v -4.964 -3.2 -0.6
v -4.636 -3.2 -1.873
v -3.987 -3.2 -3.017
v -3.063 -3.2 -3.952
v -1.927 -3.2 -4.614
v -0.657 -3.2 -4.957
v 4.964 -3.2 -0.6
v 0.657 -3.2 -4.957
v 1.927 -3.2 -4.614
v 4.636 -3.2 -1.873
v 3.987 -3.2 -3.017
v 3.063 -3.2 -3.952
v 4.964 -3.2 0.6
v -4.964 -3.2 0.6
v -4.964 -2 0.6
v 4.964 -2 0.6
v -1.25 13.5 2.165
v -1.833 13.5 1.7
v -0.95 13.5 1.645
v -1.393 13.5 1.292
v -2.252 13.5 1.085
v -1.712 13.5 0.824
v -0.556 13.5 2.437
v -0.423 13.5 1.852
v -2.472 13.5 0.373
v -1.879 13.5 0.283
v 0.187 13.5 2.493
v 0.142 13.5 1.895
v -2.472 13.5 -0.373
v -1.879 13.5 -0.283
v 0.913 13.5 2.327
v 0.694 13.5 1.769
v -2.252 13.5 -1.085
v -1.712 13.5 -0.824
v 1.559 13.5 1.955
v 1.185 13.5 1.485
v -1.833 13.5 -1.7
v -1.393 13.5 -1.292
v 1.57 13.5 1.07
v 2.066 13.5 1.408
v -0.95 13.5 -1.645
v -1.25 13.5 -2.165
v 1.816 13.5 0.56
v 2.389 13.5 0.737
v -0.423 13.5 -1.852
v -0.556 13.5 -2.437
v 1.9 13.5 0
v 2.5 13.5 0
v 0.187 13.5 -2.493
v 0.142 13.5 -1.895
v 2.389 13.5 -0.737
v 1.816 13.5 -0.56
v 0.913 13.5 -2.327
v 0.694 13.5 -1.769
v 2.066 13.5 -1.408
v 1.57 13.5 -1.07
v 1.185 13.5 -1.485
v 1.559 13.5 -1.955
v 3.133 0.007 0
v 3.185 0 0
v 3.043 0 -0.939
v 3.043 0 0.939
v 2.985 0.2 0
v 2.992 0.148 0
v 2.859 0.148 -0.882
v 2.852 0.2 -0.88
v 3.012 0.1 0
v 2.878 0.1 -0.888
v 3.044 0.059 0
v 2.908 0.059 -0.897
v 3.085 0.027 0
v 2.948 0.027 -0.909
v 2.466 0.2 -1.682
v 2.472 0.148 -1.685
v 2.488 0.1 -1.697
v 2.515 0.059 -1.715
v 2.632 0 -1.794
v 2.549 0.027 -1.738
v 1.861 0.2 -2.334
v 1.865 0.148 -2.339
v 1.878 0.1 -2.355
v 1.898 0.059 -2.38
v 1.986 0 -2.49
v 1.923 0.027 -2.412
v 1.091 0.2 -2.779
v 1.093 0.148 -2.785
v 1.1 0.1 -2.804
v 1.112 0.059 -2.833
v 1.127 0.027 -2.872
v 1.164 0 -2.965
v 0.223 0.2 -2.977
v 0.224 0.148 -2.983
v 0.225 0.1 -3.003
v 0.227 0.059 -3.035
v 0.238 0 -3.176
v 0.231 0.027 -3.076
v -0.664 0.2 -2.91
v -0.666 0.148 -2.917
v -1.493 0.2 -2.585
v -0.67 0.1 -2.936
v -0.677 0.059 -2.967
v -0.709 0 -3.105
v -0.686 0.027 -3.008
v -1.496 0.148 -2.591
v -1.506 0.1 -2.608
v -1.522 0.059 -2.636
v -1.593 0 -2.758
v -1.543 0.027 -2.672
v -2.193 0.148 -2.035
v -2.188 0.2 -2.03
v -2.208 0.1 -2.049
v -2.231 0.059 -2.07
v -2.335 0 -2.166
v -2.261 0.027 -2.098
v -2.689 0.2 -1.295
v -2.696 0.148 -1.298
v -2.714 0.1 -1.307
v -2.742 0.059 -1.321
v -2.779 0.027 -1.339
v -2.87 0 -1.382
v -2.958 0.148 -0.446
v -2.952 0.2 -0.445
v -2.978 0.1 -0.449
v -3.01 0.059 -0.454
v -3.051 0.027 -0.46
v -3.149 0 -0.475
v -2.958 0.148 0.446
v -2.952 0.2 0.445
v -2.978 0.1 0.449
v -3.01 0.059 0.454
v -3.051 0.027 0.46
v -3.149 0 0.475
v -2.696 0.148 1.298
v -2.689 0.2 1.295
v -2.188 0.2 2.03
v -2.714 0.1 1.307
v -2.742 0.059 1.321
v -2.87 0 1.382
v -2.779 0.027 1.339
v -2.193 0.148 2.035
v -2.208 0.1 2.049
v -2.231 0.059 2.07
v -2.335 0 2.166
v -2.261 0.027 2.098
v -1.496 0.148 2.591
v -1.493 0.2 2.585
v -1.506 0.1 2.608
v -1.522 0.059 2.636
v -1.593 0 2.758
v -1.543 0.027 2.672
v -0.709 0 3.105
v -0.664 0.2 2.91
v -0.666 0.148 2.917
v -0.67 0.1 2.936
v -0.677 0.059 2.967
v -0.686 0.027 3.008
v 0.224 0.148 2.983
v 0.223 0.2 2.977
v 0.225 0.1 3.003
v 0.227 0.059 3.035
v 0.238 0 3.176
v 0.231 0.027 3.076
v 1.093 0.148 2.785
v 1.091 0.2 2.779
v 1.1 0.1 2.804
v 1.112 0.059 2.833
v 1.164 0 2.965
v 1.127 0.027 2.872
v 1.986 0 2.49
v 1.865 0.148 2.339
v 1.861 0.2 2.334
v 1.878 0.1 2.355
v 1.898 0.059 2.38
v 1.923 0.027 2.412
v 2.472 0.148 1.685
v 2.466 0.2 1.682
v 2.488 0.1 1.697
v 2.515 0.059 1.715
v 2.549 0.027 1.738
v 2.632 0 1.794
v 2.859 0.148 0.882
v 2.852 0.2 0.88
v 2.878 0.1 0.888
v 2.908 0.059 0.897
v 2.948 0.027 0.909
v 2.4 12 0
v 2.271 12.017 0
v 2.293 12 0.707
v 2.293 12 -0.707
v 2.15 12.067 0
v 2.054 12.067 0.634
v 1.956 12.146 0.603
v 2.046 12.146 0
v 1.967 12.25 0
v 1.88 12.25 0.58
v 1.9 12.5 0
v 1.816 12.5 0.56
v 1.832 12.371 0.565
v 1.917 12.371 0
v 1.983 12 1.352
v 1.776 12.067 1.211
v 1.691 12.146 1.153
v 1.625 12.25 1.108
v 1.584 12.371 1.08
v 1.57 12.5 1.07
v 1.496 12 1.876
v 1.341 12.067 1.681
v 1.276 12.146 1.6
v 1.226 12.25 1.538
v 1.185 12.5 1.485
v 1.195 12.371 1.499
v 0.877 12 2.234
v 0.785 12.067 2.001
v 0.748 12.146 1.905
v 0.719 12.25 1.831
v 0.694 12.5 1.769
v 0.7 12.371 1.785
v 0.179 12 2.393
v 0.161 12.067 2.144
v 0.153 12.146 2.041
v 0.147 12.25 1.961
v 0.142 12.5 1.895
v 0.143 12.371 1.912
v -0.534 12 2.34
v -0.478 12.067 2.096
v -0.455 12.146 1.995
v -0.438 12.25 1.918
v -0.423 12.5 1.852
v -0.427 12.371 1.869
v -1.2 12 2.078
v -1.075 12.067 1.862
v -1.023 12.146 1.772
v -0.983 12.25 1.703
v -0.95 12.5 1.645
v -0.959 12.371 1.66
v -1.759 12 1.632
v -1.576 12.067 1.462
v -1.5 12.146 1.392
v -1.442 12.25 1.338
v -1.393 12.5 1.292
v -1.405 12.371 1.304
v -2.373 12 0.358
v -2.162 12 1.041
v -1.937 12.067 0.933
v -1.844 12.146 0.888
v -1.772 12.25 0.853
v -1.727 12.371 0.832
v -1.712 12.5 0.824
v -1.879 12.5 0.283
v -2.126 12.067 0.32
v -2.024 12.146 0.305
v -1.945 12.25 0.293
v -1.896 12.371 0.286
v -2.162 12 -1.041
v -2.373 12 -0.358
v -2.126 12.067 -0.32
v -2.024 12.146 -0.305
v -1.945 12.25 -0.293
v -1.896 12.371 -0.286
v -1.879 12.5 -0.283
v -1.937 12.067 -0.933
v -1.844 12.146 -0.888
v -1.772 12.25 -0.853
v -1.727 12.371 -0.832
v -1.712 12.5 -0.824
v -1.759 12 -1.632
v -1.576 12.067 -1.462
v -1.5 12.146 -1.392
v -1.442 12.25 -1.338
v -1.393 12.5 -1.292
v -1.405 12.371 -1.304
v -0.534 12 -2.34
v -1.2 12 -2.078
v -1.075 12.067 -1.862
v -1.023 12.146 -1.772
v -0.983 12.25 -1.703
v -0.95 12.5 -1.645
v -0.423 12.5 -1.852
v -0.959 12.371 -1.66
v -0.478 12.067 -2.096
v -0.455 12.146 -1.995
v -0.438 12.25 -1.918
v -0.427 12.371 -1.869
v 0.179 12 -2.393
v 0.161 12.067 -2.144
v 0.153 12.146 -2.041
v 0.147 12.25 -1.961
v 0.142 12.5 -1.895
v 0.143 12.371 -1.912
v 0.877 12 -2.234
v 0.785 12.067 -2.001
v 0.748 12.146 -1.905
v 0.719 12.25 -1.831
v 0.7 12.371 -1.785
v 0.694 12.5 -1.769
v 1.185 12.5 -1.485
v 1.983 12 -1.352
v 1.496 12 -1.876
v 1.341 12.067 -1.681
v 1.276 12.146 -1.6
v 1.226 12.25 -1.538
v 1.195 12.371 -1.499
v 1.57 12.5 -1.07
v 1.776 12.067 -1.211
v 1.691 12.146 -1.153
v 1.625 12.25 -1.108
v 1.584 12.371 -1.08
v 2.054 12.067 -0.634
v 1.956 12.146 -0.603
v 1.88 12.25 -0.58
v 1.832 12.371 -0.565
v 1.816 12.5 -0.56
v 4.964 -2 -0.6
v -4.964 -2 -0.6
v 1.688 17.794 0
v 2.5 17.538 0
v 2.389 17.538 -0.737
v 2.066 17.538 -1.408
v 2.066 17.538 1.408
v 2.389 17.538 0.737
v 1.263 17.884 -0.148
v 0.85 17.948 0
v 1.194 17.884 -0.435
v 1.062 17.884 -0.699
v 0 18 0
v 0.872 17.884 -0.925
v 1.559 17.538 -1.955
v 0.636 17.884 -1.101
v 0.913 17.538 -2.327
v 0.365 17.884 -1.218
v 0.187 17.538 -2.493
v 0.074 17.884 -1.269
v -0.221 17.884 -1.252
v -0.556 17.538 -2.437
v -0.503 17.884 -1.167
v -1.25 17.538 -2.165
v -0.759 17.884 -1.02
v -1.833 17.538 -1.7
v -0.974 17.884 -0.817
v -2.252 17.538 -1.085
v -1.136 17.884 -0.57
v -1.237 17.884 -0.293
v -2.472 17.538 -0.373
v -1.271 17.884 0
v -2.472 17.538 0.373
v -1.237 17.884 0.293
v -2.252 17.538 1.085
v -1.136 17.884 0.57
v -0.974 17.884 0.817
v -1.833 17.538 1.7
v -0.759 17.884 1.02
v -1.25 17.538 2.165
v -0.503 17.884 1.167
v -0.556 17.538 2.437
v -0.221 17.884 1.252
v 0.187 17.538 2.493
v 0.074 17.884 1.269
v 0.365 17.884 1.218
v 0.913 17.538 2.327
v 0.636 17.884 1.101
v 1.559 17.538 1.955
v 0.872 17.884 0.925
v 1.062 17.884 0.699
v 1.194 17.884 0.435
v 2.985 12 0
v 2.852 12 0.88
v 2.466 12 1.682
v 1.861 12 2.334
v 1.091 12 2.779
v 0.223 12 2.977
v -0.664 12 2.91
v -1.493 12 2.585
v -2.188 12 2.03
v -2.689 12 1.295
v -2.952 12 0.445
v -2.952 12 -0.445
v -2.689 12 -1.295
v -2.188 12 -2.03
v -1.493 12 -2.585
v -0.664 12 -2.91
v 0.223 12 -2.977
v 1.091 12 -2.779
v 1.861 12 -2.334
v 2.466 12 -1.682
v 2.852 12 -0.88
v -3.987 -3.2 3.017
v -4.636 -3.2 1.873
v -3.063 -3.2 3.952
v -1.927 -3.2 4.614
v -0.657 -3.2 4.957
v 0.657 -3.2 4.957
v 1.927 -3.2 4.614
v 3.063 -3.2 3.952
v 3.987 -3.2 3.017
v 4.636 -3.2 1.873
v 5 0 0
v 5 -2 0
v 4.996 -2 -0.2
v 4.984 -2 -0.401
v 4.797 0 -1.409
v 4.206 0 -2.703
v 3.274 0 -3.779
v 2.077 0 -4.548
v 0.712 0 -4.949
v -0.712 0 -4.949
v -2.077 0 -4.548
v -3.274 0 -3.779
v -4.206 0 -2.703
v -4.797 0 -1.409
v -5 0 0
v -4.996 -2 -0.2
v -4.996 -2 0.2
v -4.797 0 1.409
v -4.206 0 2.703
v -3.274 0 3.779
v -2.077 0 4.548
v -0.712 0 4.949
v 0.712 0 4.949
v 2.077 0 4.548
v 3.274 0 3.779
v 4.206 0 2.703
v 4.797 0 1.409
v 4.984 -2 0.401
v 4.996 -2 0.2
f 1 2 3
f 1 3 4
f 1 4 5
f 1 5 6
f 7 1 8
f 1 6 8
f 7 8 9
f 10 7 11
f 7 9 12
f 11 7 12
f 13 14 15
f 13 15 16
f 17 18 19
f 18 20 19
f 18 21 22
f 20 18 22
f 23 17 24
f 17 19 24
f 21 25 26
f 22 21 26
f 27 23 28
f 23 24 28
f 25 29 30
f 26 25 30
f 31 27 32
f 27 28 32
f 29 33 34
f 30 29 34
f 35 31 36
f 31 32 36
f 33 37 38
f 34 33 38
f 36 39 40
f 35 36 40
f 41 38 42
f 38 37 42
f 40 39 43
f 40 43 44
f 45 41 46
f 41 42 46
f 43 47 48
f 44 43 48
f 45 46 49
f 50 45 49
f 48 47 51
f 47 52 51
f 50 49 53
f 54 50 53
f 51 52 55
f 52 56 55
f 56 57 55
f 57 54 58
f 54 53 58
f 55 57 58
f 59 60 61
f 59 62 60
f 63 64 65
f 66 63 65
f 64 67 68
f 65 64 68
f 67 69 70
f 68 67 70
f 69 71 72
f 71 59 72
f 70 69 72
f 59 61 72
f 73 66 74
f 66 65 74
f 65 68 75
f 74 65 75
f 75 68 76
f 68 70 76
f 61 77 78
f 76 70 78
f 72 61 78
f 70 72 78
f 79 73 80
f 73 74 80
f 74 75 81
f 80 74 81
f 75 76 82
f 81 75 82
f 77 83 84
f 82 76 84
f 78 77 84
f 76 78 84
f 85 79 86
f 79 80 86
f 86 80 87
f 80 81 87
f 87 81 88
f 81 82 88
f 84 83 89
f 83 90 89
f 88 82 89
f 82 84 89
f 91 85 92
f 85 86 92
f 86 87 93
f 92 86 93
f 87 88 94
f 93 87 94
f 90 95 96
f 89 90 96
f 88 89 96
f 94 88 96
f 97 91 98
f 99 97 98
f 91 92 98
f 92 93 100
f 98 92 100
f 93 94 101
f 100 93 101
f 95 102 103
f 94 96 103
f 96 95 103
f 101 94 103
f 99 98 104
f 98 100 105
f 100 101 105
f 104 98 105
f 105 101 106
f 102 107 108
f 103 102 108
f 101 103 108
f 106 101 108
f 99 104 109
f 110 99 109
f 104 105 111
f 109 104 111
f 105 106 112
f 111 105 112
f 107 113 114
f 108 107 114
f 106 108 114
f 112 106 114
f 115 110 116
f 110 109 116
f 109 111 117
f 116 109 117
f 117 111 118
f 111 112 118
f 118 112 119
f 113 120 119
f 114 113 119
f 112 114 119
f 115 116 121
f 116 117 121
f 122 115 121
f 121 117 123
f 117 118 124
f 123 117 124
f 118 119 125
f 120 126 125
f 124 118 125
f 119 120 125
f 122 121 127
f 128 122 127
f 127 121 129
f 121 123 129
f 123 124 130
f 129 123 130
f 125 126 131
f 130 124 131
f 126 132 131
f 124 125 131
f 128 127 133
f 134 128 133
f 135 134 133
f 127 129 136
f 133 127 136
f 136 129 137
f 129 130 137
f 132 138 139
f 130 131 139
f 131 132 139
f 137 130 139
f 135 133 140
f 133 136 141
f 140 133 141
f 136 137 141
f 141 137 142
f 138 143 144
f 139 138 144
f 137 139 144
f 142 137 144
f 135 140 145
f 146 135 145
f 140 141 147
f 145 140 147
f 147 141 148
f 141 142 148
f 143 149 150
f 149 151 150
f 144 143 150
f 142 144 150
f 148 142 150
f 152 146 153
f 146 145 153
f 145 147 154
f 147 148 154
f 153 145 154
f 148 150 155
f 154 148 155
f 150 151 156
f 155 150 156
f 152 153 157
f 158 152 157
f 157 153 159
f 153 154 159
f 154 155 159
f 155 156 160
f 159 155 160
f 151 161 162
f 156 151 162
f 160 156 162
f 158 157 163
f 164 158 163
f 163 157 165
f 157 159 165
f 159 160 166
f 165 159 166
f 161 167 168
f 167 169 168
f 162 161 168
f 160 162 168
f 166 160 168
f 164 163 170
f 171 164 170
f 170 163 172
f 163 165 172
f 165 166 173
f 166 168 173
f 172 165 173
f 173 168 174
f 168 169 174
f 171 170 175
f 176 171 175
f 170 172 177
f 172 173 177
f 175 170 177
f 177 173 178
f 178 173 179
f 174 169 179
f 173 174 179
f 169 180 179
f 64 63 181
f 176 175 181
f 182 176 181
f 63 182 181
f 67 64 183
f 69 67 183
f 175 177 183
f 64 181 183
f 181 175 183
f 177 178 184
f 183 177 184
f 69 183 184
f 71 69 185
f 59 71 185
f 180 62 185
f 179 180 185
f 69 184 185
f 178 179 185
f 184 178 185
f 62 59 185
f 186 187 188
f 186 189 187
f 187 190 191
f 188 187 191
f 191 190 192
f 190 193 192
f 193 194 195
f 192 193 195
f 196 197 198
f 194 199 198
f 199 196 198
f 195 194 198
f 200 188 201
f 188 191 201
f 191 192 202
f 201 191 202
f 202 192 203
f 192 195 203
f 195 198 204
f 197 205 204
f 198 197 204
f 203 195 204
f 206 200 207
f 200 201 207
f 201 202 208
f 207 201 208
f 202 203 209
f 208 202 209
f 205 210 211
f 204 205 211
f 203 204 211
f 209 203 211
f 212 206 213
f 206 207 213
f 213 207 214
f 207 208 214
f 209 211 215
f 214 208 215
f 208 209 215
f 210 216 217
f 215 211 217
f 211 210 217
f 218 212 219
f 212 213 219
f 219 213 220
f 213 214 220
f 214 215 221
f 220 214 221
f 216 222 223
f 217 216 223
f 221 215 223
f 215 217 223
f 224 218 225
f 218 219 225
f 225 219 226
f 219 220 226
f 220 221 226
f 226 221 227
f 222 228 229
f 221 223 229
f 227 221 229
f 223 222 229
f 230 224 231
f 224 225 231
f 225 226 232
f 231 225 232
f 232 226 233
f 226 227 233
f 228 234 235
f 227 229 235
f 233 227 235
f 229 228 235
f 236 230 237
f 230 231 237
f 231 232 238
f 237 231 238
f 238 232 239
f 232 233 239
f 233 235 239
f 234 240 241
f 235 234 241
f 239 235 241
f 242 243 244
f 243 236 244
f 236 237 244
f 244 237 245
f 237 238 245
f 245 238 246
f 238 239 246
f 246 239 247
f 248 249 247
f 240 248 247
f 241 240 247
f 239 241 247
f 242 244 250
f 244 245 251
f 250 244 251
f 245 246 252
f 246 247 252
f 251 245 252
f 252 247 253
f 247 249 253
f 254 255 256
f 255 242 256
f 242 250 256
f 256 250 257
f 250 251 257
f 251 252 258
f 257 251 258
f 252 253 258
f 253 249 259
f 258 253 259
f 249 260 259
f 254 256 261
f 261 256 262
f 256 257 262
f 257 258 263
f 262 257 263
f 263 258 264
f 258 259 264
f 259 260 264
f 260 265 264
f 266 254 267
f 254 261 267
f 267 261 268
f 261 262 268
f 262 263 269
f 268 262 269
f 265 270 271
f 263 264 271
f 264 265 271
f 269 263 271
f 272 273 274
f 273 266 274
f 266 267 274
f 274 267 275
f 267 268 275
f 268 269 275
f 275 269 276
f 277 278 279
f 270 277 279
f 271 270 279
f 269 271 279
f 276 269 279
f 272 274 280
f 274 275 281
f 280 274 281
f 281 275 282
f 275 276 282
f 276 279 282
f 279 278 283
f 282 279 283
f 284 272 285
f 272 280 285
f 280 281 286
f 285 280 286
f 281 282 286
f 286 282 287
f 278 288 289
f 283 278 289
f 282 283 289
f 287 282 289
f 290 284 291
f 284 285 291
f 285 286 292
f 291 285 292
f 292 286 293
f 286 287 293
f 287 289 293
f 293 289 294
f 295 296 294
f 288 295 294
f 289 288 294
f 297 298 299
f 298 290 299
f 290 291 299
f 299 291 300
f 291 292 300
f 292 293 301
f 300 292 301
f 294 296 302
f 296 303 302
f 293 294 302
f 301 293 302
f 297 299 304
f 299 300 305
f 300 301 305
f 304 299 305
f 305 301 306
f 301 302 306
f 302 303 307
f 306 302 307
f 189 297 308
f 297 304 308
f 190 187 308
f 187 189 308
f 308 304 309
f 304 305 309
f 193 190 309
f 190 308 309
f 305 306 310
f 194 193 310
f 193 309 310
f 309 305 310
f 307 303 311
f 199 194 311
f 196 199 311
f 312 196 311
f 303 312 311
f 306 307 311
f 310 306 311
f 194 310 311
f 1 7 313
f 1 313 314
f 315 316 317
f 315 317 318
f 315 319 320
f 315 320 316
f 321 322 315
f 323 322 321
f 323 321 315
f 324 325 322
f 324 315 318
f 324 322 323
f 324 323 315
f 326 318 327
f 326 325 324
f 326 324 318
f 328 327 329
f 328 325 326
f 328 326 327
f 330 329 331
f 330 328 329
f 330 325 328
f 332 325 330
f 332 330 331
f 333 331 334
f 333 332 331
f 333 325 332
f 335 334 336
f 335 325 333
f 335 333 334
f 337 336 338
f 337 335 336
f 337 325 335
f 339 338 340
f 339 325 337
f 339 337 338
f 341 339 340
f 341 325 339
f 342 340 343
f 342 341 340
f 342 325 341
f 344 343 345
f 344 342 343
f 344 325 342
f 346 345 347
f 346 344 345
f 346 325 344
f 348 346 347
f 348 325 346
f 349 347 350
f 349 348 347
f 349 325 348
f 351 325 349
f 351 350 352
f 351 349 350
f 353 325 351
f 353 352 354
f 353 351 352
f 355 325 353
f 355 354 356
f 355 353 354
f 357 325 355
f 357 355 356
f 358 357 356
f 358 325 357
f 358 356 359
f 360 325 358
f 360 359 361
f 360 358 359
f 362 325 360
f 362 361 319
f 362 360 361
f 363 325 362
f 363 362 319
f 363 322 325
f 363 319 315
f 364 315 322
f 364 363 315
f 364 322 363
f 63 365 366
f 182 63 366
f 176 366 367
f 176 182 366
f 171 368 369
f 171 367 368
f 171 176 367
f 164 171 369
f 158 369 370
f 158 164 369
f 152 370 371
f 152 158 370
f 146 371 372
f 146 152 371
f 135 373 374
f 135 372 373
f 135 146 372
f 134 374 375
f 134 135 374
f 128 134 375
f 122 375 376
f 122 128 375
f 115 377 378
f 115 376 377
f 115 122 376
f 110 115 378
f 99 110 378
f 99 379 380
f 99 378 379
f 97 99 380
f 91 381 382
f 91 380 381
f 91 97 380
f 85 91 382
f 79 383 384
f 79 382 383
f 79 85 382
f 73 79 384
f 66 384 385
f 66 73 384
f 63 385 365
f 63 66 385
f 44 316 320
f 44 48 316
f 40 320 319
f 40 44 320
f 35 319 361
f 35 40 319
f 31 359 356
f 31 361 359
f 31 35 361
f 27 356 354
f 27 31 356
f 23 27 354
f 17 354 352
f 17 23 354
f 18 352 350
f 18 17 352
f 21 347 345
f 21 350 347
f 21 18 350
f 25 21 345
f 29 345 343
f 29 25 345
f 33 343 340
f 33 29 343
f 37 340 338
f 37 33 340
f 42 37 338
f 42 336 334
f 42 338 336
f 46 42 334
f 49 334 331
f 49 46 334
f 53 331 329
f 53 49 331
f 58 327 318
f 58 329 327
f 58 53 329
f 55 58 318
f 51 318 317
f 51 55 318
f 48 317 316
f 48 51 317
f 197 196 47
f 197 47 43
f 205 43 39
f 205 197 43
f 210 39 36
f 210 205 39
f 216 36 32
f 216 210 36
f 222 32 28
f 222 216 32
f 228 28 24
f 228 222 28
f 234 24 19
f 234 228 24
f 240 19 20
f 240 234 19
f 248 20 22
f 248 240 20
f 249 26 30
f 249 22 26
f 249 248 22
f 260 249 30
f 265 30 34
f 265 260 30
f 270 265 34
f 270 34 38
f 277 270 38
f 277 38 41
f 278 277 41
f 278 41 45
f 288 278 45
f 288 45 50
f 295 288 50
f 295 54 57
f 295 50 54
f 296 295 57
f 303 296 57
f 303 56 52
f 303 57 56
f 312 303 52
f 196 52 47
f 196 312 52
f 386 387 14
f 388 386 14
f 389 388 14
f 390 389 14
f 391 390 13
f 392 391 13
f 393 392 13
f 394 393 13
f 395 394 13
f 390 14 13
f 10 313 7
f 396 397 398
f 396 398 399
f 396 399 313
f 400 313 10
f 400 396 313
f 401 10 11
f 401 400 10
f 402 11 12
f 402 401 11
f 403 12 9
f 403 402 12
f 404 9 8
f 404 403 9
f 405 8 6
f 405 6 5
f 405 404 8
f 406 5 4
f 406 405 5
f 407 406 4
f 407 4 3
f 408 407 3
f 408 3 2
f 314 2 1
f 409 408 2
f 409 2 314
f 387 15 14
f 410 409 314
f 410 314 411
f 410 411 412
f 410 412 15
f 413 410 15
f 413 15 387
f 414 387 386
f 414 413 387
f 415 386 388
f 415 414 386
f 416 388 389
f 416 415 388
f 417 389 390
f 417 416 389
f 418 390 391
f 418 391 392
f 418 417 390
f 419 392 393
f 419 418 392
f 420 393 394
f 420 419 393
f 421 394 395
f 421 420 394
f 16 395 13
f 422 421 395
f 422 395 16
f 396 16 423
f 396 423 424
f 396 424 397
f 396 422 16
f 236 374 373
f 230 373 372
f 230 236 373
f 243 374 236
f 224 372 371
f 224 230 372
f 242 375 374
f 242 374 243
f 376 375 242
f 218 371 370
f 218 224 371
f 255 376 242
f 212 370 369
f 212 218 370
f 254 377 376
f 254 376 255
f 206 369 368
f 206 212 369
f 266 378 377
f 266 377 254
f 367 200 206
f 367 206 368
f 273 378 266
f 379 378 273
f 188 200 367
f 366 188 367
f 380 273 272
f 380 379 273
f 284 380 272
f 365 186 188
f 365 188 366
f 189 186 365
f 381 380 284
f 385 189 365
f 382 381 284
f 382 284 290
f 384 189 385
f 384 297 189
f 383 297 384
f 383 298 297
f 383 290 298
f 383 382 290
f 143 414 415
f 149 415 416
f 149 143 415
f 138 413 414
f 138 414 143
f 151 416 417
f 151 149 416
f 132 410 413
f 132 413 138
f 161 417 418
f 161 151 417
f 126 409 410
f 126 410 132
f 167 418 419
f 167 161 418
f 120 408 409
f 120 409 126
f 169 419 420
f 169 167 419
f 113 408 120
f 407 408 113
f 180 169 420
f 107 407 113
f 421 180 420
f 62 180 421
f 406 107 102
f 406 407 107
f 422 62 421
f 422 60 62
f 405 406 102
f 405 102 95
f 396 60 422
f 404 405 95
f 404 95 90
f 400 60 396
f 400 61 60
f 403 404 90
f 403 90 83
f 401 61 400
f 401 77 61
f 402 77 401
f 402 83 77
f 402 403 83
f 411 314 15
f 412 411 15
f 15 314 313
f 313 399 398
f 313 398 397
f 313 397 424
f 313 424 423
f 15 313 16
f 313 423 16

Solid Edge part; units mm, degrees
sketch "Sketch1" plane through (0, 0, 0) normal (0, 0, 1) x (1, 0, 0)
  line L0 (2.985, 12) -> (2.985, 0)
  line L1 (5, 0) -> (2.985, 0)
  line L2 (5, -3.2) -> (5, 0)
  line L3 (0, -3.2) -> (5, -3.2)
  line L4 (0, 0) -> (0, -3.2)
  line L5 (0, 0) -> (0, 12)
  line L6 (0, 12) -> (0, 13.5)
  line L7 (0, 13.5) -> (0, 17.5383)
  line L8 (0, 17.5383) -> (0, 18)
  arc A0 (2.5, 17.5383) -> (0, 18) centre (0, 11) ccw
  line L9 (2.5, 17.5383) -> (2.5, 13.5)
  line L10 (2.5, 13.5) -> (1.9, 13.5)
  line L11 (1.9, 13.5) -> (1.9, 12)
  line L12 (1.9, 12) -> (2.985, 12)
revolve "RevolvedProtrusion1" add sketch "Sketch1" angle 360 about axis through (0, 0, 0) along (0, 1, 0)
fillet "Round1" radius 0.2 1 edges at (0, 0, -2.985)
sketch "Sketch2" plane through (0, -3.2, 0) normal (0, -1, 0) x (1, 0, 0)
  line L0 (-5, 0.6) -> (5, 0.6)
  line L1 (5, 0.6) -> (5, -0.6)
  line L2 (5, -0.6) -> (-5, -0.6)
  line L3 (-5, -0.6) -> (-5, 0.6)
  dimension "D1" = 1.2
extrude "拉伸除料_1" cut sketch "Sketch2" against normal blind 1.2
fillet "Round2" radius 0.5 1 edges at (0, 12, -1.9)
cosmetic_thread "Thread1" size "M5"
properties part number "N2611-031B" material "不锈钢 304"
